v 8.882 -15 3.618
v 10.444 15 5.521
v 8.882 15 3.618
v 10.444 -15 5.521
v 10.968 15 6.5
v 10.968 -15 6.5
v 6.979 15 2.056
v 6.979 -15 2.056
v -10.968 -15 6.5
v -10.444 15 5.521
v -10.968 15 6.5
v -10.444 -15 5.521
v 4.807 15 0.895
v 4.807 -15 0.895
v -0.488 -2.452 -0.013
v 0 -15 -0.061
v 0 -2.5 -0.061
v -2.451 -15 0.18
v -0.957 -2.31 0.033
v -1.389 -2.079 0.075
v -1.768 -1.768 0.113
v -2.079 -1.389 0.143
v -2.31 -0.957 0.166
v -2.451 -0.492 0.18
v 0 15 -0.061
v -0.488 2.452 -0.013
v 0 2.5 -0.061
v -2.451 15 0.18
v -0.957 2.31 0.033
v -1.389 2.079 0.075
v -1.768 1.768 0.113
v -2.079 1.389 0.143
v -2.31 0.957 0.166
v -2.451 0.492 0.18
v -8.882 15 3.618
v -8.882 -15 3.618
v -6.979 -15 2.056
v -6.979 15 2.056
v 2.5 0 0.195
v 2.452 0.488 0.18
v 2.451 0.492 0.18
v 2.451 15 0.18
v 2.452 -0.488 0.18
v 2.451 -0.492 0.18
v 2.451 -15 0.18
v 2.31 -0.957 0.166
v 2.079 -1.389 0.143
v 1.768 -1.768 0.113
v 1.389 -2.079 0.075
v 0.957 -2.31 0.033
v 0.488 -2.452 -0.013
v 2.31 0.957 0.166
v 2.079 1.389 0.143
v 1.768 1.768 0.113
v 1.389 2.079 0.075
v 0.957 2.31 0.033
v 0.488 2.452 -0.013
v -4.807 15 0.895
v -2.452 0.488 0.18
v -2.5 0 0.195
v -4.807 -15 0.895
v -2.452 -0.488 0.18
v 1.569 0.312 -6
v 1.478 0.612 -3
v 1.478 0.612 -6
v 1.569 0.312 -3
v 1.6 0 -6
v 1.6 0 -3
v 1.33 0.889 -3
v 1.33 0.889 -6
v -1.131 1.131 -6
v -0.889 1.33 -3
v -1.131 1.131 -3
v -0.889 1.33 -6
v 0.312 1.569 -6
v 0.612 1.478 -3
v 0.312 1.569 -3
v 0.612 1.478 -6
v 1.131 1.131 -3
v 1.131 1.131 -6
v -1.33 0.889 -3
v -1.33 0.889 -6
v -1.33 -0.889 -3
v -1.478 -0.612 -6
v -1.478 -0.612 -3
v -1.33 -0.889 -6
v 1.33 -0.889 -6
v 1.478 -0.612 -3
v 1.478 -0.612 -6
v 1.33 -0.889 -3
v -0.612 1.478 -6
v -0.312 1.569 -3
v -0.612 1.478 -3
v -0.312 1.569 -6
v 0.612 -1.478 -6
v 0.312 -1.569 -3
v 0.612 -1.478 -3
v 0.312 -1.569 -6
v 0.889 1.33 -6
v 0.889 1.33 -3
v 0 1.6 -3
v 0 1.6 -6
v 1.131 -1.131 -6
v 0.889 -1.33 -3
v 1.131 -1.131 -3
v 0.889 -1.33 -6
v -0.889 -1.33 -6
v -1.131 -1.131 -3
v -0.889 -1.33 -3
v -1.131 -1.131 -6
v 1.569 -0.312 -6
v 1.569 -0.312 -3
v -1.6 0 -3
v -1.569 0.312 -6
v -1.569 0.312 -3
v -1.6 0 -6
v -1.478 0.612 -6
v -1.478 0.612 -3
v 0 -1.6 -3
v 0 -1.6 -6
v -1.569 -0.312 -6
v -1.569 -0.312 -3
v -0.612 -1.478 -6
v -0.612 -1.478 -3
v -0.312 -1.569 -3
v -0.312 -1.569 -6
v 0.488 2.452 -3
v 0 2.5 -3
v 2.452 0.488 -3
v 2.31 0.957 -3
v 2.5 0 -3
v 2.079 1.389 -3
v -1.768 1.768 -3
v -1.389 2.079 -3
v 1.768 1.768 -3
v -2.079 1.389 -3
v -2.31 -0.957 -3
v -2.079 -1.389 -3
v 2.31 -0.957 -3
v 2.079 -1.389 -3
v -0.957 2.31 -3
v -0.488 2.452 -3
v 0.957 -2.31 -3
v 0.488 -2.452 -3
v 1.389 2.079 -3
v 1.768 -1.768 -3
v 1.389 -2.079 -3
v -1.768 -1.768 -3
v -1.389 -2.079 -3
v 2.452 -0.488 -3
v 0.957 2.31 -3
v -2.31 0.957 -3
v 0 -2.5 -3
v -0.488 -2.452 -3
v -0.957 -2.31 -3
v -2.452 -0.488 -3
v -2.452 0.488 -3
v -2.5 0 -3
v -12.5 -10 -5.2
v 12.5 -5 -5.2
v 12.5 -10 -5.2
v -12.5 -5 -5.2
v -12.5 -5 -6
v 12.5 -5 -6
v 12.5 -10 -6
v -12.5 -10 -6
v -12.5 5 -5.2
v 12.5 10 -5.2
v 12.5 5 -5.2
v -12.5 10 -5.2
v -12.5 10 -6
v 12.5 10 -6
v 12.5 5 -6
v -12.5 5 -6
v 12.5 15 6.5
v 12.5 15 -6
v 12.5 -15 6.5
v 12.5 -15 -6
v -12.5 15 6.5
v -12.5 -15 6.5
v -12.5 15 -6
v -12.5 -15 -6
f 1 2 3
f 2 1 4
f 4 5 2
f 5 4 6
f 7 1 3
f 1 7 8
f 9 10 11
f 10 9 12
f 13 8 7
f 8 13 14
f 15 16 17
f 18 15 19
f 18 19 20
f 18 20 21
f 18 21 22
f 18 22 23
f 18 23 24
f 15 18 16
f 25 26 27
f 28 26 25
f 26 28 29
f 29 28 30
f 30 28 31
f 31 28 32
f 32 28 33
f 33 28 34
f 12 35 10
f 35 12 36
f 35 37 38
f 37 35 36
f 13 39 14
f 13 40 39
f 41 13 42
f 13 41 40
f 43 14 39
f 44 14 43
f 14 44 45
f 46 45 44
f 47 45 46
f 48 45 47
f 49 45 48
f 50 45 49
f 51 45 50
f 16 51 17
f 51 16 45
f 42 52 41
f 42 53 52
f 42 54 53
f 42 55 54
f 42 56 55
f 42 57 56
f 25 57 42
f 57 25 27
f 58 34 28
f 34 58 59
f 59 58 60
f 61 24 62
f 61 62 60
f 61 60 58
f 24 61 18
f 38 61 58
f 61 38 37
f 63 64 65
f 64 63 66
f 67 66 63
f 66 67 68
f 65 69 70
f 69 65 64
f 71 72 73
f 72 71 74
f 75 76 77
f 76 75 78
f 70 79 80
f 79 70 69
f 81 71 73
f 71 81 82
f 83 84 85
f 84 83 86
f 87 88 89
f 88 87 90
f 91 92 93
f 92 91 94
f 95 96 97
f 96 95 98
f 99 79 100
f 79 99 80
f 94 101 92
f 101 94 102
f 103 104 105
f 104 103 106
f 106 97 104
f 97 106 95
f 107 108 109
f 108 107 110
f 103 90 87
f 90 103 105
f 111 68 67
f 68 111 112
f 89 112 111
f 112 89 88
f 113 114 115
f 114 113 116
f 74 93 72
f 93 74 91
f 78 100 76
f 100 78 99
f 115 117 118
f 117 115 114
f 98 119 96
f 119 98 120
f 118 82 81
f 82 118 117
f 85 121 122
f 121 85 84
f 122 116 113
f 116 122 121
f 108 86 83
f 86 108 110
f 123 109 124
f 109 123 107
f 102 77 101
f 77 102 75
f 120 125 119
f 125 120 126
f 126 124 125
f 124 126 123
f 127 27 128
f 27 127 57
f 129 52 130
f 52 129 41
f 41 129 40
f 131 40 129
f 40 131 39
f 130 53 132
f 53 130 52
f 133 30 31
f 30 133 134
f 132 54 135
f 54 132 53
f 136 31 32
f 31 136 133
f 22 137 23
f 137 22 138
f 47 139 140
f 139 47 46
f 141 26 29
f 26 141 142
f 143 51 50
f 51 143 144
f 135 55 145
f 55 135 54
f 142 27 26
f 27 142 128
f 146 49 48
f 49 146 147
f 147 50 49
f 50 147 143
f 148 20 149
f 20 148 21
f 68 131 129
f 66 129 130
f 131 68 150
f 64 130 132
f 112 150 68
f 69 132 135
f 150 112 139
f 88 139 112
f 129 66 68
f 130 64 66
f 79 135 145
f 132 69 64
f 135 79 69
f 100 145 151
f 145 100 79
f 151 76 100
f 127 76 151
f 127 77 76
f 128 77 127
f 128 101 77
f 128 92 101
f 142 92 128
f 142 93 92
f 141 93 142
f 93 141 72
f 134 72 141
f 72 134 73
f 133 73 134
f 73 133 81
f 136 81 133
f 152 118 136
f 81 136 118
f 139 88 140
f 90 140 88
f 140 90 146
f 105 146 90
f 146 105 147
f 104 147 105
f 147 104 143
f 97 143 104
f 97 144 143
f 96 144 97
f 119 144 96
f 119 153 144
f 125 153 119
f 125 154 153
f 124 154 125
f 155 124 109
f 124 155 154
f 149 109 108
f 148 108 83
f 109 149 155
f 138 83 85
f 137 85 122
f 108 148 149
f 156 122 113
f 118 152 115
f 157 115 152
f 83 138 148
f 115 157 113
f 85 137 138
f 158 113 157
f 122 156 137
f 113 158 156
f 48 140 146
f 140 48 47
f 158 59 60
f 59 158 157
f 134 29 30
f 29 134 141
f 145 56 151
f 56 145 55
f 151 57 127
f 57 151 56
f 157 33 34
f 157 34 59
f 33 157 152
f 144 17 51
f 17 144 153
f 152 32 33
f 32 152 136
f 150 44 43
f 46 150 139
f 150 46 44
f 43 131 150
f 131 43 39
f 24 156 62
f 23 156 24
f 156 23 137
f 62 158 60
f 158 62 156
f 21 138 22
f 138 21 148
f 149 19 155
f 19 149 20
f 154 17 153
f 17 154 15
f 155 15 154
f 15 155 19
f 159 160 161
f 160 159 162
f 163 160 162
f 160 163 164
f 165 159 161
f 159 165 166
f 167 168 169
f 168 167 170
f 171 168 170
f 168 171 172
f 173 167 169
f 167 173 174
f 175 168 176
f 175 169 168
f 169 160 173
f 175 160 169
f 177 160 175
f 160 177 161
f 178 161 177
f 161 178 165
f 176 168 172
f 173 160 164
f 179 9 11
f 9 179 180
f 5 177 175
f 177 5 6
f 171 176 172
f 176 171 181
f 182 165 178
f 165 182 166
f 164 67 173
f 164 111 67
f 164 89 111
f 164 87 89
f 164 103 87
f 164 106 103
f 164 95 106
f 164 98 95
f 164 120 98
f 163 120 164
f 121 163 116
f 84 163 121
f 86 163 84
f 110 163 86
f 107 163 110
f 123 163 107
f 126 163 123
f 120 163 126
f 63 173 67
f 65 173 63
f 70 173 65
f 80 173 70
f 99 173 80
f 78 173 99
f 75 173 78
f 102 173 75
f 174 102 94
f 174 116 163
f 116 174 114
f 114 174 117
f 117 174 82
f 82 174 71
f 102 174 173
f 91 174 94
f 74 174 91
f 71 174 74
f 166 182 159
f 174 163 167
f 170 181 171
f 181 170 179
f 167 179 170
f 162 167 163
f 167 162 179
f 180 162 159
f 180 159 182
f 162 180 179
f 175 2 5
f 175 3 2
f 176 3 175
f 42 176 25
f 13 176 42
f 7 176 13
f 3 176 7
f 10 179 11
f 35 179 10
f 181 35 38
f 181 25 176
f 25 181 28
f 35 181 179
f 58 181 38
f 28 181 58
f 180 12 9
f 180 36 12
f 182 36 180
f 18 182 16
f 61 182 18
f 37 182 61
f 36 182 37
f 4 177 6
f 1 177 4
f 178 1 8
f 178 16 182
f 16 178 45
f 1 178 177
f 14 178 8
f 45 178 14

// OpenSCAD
// file: util.scad
/* circumscribed (outer) polygons, polygonal cylinders, and cones */

module cylinder_outer(h = 0, r = 0, d = 0, fn = $fn) {
   fudge = 1/cos(180/fn);
   if (r == 0) cylinder(h=h, d=d*fudge, $fn=fn);
   else cylinder(h=h, r=r*fudge, $fn=fn);
}

module cone_outer(h = 0, r1 = 0, r2 = 0, d1 = 0, d2 = 0, fn = $fn) {
   fudge = 1/cos(180/fn);
   if ((r1 == 0) && (r2 == 0)) cylinder(h=h, d1=d1*fudge, d2=d2*fudge, $fn=fn);
   else cylinder(h=h, r1=r1*fudge, r2=r2*fudge, $fn=fn);
}

module circle_outer(d = 0, r = 0, fn = $fn) {
    fudge = 1/cos(180/fn);
    if (r == 0) circle(d = d*fudge, $fn=fn);
    else circle(r = r*fudge, $fn=fn);
}

/* create two (washers, screws, standoffs) separated by a distance */

module twice() {
    translate([0, stepper_screw_spacing/2, 0])
    children();
    translate([0, -stepper_screw_spacing/2, 0])
    children();
}

/* make cutout */

module cutout(cut = true) {
    if (cut) 
        difference() {
            children();
            translate([0, 0, -100])
            cube([200, 200, 200]);
        }
    else
        children();
}

/* not truncated */
// main file
/*
 * mount for vacuum pump. Motor length 30mm, motor diameter 25mm.
 */
include <util.scad>
eps1 = 0.001;
eps2 = 2*eps1;
$fn=32;
motor_dia = 25.0;
motor_l = 30.0;
wall = 2.4;

module pump_mount() {
    difference() {
        pump_mount_body();
        pump_mount_holes();
    }
}

module pump_mount_body() {
    translate([-motor_dia/2,-motor_l/2,-6])
    cube([motor_dia, motor_l, motor_dia/2]);
}

module pump_mount_holes() {
    translate([0,-motor_l,motor_dia/2])
    rotate([-90,0,0])
    rotate([0,0,180/8])
    cylinder_outer(d=motor_dia+eps2, h = 2*motor_l /*, fn = 8 */ ); 
    
    cylinder(d=3.2,h=motor_dia, center=true);
    translate([0,0,-3])
    cylinder(d=5.0,h=motor_dia);
    
    /* tie-wraps to attach motor */
    translate([0,-motor_l/4,-6])
    cube([2*motor_dia, 5, 1.6], center=true);
    translate([0,motor_l/4,-6])
    cube([2*motor_dia, 5, 1.6], center=true);
}

pump_mount();
